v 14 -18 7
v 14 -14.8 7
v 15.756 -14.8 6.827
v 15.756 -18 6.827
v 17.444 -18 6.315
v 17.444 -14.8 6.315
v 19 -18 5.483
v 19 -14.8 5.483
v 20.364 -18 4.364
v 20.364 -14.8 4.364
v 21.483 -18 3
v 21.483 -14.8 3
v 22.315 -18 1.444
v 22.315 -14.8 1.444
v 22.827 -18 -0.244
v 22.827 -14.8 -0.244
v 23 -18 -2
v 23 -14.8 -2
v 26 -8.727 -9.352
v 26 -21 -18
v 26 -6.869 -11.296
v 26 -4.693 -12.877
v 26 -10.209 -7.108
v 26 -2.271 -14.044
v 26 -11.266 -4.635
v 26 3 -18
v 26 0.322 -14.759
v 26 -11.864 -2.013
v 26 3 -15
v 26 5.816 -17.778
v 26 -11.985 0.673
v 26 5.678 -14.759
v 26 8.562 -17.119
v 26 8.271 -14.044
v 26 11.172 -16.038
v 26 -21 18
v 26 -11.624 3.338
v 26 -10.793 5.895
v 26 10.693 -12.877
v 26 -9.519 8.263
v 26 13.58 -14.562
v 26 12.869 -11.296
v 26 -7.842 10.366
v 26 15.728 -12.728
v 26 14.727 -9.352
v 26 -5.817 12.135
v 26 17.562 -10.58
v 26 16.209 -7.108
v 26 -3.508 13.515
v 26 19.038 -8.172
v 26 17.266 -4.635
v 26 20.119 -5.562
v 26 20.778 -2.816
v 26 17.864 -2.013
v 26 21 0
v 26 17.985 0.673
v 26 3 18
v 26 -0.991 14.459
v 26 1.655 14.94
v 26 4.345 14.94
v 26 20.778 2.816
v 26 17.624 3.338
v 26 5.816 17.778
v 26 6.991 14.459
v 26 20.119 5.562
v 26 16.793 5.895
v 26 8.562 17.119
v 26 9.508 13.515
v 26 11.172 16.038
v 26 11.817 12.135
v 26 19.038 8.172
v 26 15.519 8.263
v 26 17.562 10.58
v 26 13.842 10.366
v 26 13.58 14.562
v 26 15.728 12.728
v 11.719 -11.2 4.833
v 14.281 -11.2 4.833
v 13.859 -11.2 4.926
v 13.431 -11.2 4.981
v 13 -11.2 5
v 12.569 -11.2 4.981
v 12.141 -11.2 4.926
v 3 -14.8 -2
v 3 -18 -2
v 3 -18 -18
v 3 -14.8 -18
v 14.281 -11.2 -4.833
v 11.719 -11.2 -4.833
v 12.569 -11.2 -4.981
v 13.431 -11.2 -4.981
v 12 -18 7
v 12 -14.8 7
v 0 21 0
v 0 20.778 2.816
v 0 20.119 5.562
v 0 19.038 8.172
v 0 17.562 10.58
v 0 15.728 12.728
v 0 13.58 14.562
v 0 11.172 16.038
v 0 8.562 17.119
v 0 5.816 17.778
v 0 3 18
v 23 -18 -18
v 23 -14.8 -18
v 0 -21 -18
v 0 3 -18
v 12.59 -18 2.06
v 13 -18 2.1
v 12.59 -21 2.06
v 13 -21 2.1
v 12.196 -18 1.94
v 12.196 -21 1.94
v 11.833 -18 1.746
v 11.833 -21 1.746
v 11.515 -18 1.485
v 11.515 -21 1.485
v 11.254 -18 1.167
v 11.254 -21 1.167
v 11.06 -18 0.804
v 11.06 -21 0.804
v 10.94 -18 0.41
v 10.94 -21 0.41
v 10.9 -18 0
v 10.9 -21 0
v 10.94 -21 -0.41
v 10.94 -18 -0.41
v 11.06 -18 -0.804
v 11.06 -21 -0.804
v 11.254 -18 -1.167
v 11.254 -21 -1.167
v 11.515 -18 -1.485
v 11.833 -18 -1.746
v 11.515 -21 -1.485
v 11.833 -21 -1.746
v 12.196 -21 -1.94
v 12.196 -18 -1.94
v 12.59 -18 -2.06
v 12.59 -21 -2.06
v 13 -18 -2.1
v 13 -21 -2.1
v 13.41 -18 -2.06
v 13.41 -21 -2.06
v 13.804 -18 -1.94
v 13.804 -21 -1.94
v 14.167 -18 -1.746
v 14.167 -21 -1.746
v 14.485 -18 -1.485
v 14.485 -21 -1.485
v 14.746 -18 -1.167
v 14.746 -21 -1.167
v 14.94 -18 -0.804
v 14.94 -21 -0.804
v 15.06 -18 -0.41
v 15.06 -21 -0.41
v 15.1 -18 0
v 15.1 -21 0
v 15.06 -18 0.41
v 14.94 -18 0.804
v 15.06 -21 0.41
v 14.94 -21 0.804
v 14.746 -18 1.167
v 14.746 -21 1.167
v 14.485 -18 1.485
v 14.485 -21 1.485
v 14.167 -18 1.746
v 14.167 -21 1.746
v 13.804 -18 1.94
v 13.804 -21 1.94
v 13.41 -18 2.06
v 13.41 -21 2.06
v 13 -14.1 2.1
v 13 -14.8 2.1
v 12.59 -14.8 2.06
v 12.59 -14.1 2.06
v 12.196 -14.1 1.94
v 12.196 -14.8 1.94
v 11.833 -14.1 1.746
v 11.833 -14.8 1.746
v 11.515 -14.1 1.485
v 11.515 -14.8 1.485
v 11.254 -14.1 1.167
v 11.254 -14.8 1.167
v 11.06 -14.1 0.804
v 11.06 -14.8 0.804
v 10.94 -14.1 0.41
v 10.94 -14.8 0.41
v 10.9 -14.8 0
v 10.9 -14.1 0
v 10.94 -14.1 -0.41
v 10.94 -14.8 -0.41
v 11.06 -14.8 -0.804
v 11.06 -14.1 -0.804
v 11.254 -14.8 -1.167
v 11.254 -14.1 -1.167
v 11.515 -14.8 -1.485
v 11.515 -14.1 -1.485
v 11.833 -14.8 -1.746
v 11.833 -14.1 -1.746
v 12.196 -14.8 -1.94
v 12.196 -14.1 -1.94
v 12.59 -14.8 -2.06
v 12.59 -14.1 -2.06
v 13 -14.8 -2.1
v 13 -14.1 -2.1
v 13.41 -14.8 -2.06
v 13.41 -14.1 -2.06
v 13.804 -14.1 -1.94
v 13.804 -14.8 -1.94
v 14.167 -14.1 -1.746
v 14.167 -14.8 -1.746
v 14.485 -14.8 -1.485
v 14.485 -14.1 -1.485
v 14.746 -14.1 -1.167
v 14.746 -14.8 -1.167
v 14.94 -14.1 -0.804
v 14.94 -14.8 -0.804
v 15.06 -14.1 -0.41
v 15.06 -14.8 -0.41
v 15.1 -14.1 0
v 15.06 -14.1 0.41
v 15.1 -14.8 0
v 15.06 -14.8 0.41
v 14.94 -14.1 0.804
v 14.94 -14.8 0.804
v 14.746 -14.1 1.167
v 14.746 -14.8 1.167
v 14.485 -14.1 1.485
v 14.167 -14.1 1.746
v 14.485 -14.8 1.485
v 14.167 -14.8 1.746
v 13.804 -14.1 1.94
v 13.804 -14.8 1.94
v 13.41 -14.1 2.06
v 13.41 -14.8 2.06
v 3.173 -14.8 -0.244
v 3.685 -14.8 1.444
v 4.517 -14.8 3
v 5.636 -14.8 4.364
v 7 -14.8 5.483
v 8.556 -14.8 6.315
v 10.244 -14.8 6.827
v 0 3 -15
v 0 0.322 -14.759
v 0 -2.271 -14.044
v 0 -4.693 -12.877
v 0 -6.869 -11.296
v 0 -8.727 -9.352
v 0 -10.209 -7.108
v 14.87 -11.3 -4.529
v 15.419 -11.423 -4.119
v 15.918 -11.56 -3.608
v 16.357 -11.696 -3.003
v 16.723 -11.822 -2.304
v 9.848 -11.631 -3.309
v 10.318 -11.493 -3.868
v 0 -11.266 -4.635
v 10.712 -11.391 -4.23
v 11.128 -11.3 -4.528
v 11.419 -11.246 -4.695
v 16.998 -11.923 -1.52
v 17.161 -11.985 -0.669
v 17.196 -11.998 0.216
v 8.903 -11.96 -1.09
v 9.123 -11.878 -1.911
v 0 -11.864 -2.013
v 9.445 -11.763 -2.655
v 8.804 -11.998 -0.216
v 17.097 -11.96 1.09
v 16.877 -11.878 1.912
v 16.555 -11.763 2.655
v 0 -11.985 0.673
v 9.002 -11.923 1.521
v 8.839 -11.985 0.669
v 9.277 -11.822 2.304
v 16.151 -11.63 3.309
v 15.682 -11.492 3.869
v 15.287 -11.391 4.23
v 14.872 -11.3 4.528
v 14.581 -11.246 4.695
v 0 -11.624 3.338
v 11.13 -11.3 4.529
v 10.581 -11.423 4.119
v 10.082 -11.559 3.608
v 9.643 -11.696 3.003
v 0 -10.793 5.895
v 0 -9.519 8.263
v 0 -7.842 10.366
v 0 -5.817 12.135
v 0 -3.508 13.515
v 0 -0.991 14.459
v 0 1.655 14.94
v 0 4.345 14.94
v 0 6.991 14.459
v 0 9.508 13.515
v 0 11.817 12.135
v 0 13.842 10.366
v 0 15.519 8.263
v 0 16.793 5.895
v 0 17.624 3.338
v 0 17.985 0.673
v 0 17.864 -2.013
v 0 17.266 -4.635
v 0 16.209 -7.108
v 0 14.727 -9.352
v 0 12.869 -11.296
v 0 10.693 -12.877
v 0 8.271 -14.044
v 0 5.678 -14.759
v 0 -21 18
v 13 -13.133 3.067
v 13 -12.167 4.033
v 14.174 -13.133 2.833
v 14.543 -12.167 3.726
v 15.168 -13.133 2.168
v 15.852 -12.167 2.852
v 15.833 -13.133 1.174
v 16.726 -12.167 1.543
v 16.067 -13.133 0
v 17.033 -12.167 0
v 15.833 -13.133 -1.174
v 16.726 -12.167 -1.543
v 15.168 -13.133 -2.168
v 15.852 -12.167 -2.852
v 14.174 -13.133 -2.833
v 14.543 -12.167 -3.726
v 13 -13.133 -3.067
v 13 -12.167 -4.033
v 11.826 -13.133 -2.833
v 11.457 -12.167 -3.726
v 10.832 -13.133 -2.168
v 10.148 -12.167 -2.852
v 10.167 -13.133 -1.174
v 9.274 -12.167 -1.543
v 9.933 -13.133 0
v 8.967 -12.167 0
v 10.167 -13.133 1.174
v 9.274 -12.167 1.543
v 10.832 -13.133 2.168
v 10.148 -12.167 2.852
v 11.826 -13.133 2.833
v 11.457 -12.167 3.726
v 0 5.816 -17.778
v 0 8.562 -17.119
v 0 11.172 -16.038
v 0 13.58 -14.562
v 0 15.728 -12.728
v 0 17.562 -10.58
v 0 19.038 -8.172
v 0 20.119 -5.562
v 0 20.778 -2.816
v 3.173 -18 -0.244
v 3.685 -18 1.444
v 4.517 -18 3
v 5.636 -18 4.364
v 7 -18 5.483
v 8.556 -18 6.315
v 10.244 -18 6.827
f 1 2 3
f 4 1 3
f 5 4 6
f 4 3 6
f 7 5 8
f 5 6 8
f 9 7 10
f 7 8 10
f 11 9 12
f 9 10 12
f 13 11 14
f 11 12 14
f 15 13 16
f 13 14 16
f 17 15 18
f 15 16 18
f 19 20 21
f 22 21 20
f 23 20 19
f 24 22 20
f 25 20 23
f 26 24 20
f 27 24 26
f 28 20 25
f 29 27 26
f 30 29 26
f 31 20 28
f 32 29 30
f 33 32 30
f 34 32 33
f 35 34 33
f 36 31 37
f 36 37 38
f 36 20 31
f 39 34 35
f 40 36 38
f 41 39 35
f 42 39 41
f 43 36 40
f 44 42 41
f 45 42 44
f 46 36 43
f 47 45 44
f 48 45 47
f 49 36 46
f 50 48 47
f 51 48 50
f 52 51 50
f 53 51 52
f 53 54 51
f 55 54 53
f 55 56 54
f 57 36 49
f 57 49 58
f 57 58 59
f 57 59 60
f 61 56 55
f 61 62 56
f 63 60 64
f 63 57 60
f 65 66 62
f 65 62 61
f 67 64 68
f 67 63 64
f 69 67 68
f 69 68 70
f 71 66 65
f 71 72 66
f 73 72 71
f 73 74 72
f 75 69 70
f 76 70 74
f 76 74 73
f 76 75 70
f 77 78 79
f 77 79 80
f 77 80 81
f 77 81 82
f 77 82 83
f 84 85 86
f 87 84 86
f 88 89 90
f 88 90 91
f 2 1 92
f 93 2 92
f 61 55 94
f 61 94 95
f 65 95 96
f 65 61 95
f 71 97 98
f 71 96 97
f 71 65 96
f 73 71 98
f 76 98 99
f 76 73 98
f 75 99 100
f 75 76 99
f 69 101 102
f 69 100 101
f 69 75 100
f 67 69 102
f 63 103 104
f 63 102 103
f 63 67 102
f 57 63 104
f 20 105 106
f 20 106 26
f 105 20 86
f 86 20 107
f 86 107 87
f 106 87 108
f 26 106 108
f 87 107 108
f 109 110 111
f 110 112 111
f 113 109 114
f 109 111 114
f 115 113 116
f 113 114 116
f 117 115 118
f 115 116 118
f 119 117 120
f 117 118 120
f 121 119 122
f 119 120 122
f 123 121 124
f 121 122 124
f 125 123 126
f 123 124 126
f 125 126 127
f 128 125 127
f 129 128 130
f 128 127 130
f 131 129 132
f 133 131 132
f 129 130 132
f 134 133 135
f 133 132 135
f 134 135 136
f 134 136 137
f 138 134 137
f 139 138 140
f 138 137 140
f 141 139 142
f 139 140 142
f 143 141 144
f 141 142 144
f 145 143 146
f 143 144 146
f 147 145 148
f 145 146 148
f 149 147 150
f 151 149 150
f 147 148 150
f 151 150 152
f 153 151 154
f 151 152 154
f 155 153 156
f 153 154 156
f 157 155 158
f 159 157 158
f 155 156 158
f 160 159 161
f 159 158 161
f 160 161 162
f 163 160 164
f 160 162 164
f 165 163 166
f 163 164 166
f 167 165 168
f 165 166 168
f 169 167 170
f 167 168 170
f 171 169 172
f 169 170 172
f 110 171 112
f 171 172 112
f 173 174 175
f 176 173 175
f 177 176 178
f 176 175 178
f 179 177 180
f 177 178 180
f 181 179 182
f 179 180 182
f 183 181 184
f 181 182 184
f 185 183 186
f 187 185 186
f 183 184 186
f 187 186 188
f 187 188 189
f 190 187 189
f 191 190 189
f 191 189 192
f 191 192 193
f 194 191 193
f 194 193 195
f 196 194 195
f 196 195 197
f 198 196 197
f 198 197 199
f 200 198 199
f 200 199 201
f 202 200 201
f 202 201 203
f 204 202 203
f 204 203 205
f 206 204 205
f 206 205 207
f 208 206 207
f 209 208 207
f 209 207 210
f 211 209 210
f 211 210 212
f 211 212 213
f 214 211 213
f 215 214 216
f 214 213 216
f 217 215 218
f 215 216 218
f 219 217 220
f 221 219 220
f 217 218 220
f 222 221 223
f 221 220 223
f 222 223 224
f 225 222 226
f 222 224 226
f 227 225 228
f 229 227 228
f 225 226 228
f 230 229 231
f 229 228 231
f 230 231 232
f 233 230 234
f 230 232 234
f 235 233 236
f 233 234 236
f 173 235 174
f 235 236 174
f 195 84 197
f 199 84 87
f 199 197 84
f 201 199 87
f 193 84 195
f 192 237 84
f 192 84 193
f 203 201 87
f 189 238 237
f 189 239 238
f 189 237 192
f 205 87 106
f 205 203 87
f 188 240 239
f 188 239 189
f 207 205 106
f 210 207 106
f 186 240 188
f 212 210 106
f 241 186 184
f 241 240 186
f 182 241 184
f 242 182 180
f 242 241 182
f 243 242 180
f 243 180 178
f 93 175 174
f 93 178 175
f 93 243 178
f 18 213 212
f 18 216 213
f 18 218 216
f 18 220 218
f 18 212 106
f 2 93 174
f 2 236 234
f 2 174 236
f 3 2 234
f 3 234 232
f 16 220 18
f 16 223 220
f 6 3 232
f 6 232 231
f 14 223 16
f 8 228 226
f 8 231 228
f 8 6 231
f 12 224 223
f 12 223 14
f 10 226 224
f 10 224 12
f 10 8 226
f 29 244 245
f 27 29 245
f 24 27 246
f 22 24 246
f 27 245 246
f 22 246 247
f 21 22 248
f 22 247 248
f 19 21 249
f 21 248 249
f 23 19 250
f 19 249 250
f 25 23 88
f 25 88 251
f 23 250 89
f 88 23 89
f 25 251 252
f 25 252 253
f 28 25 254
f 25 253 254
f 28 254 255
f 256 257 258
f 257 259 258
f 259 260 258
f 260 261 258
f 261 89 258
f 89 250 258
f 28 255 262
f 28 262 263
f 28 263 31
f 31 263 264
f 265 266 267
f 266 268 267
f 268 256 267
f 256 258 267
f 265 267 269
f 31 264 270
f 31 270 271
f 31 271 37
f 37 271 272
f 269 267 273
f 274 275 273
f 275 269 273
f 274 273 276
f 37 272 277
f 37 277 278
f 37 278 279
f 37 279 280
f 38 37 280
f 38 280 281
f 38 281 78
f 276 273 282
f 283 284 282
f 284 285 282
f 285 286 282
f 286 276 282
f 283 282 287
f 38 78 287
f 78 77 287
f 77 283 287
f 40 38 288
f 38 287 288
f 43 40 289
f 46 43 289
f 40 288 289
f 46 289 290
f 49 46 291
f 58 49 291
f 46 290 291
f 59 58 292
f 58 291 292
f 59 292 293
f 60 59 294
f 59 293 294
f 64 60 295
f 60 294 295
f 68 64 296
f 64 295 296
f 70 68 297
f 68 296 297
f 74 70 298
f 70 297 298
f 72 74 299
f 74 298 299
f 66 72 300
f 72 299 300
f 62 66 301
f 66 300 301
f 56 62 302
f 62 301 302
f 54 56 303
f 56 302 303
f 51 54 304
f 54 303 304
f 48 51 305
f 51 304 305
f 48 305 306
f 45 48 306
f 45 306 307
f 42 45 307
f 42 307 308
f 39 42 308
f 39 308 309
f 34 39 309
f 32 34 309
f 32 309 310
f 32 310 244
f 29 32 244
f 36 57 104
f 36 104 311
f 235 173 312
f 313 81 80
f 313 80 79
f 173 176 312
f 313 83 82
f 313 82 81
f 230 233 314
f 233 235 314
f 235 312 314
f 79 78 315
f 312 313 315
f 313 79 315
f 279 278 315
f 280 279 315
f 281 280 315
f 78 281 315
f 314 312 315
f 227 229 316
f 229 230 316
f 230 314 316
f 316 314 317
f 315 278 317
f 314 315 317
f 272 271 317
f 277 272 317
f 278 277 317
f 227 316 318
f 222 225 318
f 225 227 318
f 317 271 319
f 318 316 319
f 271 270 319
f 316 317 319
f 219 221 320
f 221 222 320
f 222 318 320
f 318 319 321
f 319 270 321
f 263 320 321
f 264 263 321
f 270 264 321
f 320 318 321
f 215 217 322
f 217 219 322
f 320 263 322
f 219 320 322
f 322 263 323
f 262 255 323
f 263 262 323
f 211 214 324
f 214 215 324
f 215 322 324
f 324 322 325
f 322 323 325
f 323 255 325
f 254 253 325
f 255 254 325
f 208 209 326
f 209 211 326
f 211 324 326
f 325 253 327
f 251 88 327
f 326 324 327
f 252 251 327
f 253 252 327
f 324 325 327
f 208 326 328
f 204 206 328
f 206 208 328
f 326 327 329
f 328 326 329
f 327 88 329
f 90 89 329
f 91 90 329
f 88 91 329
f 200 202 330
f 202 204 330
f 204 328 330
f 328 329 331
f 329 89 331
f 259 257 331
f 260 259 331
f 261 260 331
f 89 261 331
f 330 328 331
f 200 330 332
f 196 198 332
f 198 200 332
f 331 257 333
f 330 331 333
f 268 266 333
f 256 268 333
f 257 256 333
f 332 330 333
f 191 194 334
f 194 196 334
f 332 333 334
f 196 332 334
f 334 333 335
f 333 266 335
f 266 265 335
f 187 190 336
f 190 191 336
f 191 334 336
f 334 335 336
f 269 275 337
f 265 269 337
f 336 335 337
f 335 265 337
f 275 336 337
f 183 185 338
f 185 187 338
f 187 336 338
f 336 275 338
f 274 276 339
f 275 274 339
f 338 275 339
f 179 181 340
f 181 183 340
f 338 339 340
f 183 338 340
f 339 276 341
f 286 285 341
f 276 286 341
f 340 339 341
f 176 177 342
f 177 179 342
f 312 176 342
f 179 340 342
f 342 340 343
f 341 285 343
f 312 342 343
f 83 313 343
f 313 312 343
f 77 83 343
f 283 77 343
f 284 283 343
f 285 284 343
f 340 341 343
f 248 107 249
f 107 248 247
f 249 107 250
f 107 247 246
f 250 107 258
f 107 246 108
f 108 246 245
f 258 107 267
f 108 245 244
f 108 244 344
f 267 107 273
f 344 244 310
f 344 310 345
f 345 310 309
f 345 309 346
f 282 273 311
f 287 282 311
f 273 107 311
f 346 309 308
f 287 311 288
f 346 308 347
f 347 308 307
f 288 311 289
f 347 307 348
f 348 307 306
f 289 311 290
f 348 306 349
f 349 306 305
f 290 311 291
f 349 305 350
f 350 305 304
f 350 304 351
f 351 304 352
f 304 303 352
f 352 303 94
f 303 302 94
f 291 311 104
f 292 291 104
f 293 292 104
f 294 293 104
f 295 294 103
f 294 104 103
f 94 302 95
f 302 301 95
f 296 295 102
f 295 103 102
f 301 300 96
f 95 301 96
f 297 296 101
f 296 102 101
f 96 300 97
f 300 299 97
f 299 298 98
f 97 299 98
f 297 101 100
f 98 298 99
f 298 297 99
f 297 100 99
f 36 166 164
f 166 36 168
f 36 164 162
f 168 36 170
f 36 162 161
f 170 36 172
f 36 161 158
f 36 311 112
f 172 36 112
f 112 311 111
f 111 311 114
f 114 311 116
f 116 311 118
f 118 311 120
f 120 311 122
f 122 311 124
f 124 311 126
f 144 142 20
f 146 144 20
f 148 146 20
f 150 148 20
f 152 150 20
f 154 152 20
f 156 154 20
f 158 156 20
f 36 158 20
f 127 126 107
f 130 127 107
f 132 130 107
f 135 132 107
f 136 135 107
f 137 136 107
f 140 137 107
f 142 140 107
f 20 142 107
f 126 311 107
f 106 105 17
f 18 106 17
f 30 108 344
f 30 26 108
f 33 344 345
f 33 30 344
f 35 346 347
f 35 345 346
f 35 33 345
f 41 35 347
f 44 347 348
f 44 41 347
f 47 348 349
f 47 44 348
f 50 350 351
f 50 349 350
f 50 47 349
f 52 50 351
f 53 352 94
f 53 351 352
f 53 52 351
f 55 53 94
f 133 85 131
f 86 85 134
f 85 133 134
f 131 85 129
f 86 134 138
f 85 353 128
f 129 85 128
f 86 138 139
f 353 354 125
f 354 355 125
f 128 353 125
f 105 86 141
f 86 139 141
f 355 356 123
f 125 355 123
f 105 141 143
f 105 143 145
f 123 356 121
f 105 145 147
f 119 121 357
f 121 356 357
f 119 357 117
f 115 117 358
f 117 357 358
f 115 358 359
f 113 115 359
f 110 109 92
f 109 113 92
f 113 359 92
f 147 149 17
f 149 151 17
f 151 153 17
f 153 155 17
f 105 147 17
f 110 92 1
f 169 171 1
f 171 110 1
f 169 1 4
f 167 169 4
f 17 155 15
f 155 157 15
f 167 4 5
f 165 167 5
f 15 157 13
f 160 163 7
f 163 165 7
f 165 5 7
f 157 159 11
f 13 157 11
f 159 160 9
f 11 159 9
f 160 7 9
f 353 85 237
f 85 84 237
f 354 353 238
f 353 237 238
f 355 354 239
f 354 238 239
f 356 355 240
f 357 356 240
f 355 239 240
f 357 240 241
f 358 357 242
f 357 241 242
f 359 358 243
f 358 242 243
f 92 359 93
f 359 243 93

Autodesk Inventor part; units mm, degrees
ref_plane "YZ Plane" through (0, 0, 0) normal (1, 0, 0) x (0, 1, 0)
ref_plane "XZ Plane" through (0, 0, 0) normal (0, 1, 0) x (-1, 0, 0)
ref_plane "XY Plane" through (0, 0, 0) normal (0, 0, 1) x (1, 0, 0)
sketch "Skizze1" plane through (0, 0, 0) normal (1, 0, 0) x (0, 1, 0)
  line L0 (-21, -18) -> (21, -18)
  line L1 (21, -18) -> (21, 18)
  line L2 (21, 18) -> (-21, 18)
  line L3 (-21, 18) -> (-21, -18)
  line L4 (-21, -18) -> (21, 18) construction
  line L5 (21, -18) -> (-21, 18) construction
  point P0 (0, 0)
  dimension "d0" = 42
  dimension "d1" = 36
extrude "Extrusion1" add sketch "Skizze1" along normal blind 26
fillet "Rundung1" radius 18 2 edges at (13, 21, 18) (13, 21, -18)
sketch "Skizze2" plane through (26, 0, 0) normal (1, 0, 0) x (0, 0, -1)
  arc A0 (18, 3) -> (-18, 3) centre (0, 3) ccw projected
  circle A1 centre (0, 3) radius 15
  point P0 (0, 0)
  dimension "d5" = 30
hole "Bohrung1" at (26, 3, 0) direction (-1, 0, 0) diameter 30 end through all
ref_plane "Arbeitsebene2" through (0, -18, -18) normal (0, -1, 0) x (1, 0, 0)
ref_plane "Arbeitsebene3" through (0, -14.8, -18) normal (0, -1, 0) x (1, 0, 0)
sketch "Skizze3" plane through (0, -21, -18) normal (0, -1, 0) x (1, 0, 0)
  line L0 (0, 0) -> (26, 0) projected
  line L1 (3, 0) -> (23, 0)
  line L2 (23, 0) -> (23, 25)
  line L3 (23, 25) -> (3, 25)
  line L4 (3, 25) -> (3, 0)
  point P0 (0, 18)
  point P1 (13, 0)
  dimension "d15" = 20
  dimension "d16" = 25
extrude "Extrusion2" cut sketch "Skizze3" against normal up to surface (3.2 mm away) from surface at -3
fillet "Rundung2" radius 9 2 edges at (23, -16.4, 7) (3, -16.4, 7)
ref_plane "Arbeitsebene7" through (-35.1228, -11.2, 0) normal (0, -1, 0) x (1, 0, 0)
ref_plane "Arbeitsebene6" through (-35.1228, -12, 0) normal (0, -1, 0) x (1, 0, 0)
sketch "Skizze9" plane through (-35.1228, -11.2, 0) normal (0, -1, 0) x (1, 0, 0)
  line L0 (61.1228, 15) -> (61.1228, -15) projected
  line L1 (61.1228, -18) -> (35.1228, -18) projected
  point P0 (35.1228, 0)
  point P1 (48.1228, 0)
  dimension "d49" = 13
  dimension "d50" = 18
hole "Bohrung5" at (13, -11.2, 0) direction (0, -1, 0) diameter 4.2 depth 15 countersink diameter 10 countersink angle 90
